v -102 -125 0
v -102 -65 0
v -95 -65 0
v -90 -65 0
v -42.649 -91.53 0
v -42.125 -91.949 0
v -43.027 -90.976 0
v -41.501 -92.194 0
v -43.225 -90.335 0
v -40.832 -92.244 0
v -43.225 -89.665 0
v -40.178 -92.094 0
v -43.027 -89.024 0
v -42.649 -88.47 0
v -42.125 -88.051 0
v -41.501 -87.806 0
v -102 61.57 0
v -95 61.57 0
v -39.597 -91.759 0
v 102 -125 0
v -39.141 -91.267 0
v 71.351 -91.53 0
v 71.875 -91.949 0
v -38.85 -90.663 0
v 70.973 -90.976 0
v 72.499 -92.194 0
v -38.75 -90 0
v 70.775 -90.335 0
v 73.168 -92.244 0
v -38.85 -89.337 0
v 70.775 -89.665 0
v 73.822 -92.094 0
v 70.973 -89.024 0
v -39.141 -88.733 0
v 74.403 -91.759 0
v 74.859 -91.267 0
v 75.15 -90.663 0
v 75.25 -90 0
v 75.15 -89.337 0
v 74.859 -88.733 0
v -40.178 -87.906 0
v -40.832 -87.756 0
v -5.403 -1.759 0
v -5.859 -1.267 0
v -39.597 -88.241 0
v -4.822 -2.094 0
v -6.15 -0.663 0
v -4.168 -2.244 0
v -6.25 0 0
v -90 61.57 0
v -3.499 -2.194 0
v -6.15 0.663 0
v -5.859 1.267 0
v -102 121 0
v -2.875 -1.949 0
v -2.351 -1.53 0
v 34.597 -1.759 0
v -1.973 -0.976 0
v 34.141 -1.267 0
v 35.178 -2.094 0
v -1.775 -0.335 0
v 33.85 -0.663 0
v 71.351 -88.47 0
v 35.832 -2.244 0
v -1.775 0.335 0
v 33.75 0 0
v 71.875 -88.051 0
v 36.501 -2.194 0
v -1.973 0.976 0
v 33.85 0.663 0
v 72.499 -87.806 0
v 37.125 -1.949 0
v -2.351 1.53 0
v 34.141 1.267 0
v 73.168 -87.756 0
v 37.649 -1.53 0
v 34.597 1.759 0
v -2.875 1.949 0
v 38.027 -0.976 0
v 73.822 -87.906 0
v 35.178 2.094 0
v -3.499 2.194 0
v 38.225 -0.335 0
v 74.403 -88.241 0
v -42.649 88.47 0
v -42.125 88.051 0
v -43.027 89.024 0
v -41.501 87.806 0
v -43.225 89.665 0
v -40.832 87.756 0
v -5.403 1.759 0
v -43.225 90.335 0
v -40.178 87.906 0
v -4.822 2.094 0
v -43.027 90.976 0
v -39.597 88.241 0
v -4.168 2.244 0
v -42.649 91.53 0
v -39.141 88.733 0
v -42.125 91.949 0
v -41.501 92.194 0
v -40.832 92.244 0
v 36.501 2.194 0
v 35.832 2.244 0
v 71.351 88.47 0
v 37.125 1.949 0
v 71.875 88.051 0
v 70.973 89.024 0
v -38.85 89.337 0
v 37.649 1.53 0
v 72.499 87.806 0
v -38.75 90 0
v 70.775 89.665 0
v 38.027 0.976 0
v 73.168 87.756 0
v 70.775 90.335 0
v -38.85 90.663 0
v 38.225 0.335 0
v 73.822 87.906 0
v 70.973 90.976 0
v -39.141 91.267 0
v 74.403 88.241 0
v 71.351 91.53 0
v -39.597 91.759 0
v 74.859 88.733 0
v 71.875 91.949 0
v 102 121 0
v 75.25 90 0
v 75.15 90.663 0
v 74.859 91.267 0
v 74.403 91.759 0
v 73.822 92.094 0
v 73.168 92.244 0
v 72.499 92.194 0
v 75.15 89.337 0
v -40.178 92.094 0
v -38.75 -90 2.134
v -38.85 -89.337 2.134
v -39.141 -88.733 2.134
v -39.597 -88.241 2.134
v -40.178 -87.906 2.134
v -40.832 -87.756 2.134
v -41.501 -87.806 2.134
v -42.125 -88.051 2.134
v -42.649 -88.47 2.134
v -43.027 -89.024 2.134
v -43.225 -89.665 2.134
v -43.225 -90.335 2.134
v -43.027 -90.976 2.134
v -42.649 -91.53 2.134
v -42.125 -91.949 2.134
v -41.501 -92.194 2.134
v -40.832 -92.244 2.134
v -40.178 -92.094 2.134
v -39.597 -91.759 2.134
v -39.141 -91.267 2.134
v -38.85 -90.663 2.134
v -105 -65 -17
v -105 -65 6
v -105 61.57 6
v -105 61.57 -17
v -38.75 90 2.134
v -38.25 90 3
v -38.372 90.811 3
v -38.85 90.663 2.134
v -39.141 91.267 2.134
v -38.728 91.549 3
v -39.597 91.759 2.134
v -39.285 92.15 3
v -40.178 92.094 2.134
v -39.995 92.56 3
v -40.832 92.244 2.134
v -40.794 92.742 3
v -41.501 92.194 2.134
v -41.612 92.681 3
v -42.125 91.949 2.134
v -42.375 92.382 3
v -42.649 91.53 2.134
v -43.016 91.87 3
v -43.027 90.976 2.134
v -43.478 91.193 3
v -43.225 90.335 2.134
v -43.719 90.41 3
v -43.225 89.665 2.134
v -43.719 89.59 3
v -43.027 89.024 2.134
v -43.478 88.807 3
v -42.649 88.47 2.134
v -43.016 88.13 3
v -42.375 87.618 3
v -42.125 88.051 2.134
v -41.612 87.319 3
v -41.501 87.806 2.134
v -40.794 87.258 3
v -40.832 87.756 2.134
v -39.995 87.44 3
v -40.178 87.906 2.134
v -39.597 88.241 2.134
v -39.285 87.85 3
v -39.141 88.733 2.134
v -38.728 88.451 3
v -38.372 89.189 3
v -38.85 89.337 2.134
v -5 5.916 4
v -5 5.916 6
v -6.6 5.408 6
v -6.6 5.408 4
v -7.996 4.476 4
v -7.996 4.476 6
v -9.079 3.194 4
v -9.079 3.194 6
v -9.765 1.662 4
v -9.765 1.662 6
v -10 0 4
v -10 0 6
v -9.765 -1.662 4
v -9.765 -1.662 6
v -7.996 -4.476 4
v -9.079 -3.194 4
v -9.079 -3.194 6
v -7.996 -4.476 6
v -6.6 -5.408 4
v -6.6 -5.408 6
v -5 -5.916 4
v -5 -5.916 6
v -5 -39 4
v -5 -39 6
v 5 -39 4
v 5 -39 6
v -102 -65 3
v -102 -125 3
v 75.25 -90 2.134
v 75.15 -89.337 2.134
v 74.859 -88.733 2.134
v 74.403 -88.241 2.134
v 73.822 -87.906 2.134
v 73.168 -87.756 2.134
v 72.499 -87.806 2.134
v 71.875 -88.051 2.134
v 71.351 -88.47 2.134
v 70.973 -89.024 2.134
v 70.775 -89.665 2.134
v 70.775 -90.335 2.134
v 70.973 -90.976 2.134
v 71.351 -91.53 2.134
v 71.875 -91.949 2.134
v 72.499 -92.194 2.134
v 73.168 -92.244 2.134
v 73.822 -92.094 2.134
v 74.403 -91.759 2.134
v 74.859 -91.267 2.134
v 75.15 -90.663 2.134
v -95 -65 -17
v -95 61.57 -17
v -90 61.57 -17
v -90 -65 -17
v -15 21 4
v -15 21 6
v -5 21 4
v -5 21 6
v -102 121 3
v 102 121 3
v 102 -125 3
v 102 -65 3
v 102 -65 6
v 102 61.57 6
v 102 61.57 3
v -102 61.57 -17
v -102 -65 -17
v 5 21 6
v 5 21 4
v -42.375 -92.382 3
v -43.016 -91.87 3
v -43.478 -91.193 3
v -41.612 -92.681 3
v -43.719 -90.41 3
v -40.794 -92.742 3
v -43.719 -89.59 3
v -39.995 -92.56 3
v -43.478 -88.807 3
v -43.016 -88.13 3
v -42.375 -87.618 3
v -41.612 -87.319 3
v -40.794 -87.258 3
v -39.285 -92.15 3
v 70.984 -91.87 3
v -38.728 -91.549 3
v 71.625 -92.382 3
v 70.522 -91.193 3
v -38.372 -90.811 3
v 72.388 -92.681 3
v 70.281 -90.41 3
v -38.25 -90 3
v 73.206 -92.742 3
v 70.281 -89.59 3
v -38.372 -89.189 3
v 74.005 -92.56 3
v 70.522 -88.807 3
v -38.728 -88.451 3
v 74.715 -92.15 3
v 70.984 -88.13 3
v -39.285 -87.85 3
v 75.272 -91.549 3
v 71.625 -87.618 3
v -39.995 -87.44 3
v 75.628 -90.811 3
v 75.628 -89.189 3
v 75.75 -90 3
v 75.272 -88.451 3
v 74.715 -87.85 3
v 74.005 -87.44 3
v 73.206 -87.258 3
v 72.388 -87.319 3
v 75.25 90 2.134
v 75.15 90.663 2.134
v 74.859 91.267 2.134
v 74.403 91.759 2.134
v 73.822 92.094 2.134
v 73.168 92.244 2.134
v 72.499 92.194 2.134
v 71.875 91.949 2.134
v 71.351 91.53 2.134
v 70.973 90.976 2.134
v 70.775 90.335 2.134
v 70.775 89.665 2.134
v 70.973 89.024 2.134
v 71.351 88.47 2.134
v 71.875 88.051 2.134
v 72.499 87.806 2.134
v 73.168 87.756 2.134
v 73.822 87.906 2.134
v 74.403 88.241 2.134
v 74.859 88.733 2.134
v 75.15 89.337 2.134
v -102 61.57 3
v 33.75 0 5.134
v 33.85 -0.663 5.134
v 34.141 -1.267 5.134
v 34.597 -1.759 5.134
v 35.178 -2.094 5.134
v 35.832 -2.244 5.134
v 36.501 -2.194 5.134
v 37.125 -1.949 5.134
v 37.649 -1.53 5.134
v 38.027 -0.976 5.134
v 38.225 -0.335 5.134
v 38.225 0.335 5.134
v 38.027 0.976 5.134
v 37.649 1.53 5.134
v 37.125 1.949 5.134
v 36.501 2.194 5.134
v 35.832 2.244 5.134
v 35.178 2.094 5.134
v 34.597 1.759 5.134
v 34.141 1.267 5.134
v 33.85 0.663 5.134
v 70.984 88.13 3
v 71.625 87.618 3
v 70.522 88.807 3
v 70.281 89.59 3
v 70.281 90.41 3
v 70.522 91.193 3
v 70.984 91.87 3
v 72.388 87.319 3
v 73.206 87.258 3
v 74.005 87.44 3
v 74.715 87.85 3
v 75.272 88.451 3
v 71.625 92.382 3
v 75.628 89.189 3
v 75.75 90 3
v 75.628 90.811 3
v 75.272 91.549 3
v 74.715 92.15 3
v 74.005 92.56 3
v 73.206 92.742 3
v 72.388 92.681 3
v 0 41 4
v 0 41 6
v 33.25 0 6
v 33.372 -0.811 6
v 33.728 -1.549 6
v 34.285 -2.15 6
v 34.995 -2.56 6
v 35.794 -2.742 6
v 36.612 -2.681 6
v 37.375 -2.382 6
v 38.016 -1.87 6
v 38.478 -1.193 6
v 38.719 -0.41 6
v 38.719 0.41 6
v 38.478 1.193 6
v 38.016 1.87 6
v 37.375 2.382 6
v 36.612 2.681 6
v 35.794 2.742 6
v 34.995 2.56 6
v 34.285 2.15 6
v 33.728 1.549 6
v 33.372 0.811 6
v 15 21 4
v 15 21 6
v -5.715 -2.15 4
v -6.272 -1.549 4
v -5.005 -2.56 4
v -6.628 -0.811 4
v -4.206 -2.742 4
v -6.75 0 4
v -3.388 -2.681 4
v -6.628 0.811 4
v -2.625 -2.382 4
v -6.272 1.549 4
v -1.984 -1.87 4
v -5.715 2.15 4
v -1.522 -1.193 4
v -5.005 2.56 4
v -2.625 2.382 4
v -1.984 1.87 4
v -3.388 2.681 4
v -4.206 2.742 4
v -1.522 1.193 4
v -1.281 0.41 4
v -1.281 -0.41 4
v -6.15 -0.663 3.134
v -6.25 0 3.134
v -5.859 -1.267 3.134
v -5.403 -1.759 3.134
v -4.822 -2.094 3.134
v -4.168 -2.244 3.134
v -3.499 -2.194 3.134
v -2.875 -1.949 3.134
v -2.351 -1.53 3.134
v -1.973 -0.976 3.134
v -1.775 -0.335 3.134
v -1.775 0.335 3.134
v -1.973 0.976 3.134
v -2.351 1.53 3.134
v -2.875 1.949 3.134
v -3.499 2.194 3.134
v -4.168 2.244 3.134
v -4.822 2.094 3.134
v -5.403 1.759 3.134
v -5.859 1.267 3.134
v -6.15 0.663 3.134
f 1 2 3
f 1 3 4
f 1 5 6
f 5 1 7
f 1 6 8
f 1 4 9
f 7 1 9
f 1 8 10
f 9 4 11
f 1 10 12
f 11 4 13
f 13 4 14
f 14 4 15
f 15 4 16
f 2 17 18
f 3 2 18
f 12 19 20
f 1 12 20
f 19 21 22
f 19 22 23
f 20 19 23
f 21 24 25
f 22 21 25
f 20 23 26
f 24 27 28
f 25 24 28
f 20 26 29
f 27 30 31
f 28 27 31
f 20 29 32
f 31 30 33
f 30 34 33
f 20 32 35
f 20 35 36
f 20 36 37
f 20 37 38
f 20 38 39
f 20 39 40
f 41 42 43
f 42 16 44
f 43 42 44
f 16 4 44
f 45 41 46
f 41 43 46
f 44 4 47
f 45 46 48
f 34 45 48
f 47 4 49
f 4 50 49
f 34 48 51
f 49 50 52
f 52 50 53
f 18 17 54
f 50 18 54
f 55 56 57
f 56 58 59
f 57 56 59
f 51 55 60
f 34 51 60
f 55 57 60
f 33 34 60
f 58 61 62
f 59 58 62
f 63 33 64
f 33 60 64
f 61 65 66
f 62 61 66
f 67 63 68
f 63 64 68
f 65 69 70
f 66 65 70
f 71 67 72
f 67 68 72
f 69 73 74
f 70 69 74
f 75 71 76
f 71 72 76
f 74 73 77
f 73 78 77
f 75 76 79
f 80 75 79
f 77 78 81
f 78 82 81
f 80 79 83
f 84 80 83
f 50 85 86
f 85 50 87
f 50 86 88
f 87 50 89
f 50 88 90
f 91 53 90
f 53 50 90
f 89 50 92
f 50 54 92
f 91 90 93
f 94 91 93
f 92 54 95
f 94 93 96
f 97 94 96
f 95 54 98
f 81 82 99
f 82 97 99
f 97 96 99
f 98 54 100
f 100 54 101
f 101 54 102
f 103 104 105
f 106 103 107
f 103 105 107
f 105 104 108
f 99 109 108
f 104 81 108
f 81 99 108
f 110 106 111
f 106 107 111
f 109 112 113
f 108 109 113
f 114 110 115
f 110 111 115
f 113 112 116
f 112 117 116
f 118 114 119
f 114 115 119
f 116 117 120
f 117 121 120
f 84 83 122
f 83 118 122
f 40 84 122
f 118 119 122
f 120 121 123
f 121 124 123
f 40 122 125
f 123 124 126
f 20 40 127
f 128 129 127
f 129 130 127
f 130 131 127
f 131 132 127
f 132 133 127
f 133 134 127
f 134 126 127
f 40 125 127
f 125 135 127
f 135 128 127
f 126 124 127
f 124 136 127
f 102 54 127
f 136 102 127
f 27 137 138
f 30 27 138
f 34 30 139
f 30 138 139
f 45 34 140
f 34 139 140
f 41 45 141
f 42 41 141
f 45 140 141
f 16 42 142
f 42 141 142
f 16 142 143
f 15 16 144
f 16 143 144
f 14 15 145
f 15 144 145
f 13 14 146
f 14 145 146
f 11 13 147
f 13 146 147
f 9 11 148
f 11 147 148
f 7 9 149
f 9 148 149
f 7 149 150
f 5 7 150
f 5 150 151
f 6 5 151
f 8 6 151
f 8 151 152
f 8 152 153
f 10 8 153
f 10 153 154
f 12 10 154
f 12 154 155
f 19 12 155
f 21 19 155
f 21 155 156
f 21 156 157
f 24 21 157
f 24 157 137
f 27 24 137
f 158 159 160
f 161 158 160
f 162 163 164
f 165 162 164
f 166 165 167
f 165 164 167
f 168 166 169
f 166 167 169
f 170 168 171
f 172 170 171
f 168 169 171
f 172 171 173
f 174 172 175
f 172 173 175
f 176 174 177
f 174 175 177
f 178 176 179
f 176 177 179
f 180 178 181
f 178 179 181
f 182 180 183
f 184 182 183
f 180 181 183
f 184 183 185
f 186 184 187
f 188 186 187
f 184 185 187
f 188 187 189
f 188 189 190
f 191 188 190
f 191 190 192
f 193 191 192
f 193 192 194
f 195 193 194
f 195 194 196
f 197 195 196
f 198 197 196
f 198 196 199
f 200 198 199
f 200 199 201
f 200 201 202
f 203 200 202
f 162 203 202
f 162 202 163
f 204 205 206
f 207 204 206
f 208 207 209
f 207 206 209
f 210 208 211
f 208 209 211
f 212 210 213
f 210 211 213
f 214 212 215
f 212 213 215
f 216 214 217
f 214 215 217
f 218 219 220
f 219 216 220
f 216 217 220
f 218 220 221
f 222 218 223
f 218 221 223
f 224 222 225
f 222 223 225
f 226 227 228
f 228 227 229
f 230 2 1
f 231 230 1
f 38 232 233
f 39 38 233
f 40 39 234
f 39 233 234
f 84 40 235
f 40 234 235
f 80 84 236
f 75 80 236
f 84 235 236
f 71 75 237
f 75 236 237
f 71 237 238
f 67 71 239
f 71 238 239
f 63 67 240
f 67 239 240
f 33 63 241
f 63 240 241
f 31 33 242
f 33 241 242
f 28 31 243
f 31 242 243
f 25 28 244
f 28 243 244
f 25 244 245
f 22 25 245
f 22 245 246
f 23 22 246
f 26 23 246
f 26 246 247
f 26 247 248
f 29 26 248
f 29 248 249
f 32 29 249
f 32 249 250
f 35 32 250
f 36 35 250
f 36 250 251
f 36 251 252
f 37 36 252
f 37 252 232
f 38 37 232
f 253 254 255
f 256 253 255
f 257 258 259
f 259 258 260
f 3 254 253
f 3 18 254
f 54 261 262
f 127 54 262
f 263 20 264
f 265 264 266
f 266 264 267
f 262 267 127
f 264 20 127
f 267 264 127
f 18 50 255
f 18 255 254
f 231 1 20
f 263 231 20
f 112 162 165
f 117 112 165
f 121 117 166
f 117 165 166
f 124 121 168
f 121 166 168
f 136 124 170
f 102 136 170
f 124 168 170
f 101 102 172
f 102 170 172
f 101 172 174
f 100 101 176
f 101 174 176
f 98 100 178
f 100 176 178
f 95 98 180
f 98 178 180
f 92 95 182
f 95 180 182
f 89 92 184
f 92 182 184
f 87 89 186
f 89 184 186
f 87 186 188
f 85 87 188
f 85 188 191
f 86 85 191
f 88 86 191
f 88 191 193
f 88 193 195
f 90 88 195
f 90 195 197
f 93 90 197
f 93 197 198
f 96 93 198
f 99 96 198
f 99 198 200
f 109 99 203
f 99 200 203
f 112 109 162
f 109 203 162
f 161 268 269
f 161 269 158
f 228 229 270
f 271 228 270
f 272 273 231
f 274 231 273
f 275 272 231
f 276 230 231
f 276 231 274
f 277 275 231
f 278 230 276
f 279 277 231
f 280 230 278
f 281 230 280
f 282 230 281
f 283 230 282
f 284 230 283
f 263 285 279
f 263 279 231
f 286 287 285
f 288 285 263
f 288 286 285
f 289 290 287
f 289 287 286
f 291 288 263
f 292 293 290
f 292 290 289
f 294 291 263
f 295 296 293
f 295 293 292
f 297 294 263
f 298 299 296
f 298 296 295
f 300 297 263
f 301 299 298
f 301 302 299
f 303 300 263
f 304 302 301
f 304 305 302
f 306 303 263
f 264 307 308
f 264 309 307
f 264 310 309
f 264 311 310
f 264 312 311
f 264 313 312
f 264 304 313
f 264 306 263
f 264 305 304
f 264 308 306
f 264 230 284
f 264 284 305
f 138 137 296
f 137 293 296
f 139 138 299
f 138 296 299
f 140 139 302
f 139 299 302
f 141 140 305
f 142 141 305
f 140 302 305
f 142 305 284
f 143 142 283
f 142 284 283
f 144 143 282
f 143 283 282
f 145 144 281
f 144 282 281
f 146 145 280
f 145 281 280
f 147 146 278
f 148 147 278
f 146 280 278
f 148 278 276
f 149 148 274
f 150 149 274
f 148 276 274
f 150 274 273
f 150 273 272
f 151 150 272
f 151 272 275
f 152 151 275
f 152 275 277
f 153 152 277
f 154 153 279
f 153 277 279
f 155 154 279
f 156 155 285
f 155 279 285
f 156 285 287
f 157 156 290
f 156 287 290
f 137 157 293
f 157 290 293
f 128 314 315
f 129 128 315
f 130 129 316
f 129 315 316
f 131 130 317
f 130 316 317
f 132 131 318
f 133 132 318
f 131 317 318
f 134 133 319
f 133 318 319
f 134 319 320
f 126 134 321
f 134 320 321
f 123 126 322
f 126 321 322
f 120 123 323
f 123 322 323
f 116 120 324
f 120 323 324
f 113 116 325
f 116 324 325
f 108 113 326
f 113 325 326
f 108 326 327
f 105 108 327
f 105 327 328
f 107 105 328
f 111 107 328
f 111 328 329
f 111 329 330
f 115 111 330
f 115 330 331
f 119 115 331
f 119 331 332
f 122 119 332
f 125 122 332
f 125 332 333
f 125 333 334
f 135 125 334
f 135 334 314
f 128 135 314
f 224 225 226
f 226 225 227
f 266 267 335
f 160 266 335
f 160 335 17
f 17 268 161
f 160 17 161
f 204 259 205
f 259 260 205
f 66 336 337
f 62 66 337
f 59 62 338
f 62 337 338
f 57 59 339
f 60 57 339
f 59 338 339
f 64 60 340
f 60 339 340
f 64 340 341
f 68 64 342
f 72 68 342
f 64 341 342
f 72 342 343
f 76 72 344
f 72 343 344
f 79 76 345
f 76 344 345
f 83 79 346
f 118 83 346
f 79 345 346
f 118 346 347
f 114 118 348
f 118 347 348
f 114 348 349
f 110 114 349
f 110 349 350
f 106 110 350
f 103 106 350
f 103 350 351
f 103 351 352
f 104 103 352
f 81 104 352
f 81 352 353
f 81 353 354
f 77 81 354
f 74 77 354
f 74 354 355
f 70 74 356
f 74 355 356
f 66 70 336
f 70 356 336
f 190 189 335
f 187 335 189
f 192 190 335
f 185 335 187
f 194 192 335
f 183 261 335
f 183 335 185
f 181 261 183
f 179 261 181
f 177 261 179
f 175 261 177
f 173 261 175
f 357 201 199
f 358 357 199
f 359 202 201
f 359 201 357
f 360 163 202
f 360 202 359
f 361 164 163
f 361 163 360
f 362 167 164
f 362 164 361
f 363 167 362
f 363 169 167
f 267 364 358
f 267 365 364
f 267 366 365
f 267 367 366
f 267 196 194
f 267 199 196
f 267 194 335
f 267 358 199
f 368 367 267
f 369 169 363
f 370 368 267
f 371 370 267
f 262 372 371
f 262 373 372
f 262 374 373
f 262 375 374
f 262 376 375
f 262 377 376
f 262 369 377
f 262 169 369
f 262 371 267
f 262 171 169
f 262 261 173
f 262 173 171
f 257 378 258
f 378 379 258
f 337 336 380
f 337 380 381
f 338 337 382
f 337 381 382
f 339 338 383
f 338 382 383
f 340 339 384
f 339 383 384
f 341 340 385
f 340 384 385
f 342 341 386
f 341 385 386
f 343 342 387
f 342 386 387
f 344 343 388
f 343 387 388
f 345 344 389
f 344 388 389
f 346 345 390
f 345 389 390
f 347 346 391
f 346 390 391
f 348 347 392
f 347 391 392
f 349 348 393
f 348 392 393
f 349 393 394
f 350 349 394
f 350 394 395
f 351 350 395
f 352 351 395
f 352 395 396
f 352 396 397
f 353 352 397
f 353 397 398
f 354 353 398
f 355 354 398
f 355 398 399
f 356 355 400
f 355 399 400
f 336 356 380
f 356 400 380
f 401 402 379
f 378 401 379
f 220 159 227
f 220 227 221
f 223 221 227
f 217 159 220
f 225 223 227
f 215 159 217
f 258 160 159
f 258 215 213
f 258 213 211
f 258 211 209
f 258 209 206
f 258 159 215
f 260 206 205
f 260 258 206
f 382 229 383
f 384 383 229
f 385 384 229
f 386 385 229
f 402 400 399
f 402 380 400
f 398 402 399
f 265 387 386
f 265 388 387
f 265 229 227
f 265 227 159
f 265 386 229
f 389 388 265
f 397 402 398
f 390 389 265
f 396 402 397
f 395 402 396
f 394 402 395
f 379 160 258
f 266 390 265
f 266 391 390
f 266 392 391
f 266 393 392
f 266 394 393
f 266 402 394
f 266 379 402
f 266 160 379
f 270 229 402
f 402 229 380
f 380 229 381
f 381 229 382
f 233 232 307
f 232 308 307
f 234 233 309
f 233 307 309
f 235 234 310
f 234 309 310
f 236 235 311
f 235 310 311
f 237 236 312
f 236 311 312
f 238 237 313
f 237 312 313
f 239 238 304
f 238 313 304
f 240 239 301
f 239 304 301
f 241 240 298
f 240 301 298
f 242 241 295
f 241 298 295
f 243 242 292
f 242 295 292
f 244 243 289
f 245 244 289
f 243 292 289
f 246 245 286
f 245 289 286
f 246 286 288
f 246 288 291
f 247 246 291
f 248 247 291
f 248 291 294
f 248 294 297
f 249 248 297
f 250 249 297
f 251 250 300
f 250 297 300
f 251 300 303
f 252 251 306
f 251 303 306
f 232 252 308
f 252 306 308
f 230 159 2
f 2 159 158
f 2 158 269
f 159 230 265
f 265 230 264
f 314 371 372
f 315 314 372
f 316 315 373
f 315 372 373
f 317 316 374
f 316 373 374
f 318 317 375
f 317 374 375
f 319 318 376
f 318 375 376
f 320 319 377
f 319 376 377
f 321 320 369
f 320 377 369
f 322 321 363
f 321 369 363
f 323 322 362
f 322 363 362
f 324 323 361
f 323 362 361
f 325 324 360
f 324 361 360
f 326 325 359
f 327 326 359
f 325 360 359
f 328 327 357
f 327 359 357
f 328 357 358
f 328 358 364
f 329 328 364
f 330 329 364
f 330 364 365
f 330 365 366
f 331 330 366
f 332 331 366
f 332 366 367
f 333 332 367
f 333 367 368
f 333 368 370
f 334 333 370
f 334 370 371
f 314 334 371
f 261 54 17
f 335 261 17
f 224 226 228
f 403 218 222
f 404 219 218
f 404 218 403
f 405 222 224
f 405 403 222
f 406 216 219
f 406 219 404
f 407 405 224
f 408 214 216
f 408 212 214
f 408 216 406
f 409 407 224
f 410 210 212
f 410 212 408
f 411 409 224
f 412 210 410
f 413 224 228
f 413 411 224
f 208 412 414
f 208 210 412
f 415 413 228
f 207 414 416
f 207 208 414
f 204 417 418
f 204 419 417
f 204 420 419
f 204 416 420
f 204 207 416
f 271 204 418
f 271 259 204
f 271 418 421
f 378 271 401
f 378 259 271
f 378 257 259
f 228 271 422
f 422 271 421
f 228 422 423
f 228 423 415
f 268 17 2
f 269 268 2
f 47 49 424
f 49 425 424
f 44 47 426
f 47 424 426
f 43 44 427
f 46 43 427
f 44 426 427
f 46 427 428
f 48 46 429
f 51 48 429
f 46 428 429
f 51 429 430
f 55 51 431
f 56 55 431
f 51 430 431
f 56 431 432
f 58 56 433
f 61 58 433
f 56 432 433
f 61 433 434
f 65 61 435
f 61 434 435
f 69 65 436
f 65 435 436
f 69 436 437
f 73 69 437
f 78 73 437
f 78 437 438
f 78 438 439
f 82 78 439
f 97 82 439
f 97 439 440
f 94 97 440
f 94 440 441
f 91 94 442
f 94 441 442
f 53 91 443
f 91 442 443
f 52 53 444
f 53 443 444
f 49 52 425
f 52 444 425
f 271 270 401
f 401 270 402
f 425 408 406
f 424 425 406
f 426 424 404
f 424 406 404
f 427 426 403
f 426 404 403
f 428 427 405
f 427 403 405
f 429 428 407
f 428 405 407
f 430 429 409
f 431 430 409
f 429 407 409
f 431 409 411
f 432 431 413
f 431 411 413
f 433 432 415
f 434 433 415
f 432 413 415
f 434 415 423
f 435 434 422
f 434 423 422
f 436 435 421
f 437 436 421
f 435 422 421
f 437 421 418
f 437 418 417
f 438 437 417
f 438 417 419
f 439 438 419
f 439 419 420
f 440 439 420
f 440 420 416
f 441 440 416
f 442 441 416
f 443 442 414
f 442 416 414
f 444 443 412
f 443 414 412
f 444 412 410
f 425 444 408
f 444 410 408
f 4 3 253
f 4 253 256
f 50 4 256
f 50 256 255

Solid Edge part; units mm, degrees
sketch "Sketch1" plane through (0, 0, 0) normal (0, 0, 1) x (1, 0, 0)
  line L0 (-102, -125) -> (102, -125)
  line L1 (102, -125) -> (102, 125)
  line L2 (102, 125) -> (-102, 125)
  line L3 (-102, 125) -> (-102, -125)
  dimension "D1" = 204
  dimension "D2" = 250
extrude "Protrusion1" add sketch "Sketch1" along normal blind 3
sketch "Sketch2" plane through (0, 0, 3) normal (0, 0, 1) x (1, 0, 0)
  circle A0 centre (73, 90) radius 2.25
  circle A1 centre (73, -90) radius 2.25
  circle A2 centre (-41, -90) radius 2.25
  circle A3 centre (-41, 90) radius 2.25
  dimension "D1" = 180
  dimension "D2" = 4.5
  dimension "D3" = 114
  dimension "D4" = 73
extrude "Cutout1" cut sketch "Sketch2" against normal through all
sketch "Sketch3" plane through (0, 0, 3) normal (0, 0, 1) x (1, 0, 0)
  line L0 (-102, -65) -> (102, -65)
  line L1 (102, -65) -> (102, 61.57)
  line L2 (102, 61.57) -> (-102, 61.57)
  line L3 (-102, 61.57) -> (-102, -65)
  dimension "D1" = 65
  dimension "D2" = 61.57
extrude "Extrusionsausprägung_2" add sketch "Sketch3" along normal blind 3
sketch "Sketch4" plane through (0, 93.285, 3) normal (0, 0, 1) x (-1, 0, 0)
  line L0 (-102, -31.715) -> (102, -31.715)
  line L1 (102, -31.715) -> (102, -27.715)
  line L2 (102, -27.715) -> (-102, -27.715)
  line L3 (-102, -27.715) -> (-102, -31.715)
  dimension "D1" = 4
extrude "Cutout2" cut sketch "Sketch4" against normal through all
sketch "Sketch5" plane through (0, -1.715, 6) normal (0, 0, 1) x (-1, 0, 0)
  line L0 (5, -22.715) -> (5, 37.285)
  line L1 (5, 37.285) -> (-5, 37.285)
  line L2 (-5, 37.285) -> (-5, -22.715)
  line L3 (-5, -22.715) -> (-15, -22.715)
  line L4 (-15, -22.715) -> (0, -42.715)
  line L5 (0, -42.715) -> (15, -22.715)
  line L6 (15, -22.715) -> (5, -22.715)
  dimension "D1" = 10
  dimension "D2" = 60
  dimension "D3" = 10
  dimension "D4" = 25
  dimension "D5" = 26
extrude "Cutout3" cut sketch "Sketch5" against normal blind 2
sketch "Sketch6" plane through (0, -1.715, 6) normal (0, 0, 1) x (-1, 0, 0)
  circle A0 centre (4, -1.715) radius 2.25
  circle A1 centre (-36, -1.715) radius 2.25
extrude "Cutout4" cut sketch "Sketch6" against normal through all
sketch "Sketch7" plane through (0, -1.715, 6) normal (0, 0, 1) x (-1, 0, 0)
  circle A0 centre (4, -1.715) radius 6
  dimension "D1" = 12
extrude "Cutout5" cut sketch "Sketch7" against normal up to vertex (2 mm away)
chamfer "Fase_2" distance 0.5 angle 60 6 edges at (70.75, -90, 3) (-43.25, -90, 3) (38.25, 0, 6) (-1.75, 0, 4) (-43.25, 90, 3) (70.75, 90, 3) measured on face at (-70.04, -42.6393, 6)
sketch "Sketch8" plane through (0, -1.715, 6) normal (0, 0, 1) x (-1, 0, 0)
  line L0 (102, 63.285) -> (105, 63.285)
  line L1 (105, 63.285) -> (105, -63.285)
  line L2 (105, -63.285) -> (102, -63.285)
  line L3 (102, -63.285) -> (102, 63.285)
  dimension "D1" = 3
extrude "Extrusionsausprägung_3" add sketch "Sketch8" against normal blind 23
sketch "Sketch9" plane through (0, -2, 0) normal (0, 0, -1) x (1, 0, 0)
  line L0 (-95, 63) -> (-90, 63)
  line L1 (-90, 63) -> (-90, -63.57)
  line L2 (-90, -63.57) -> (-95, -63.57)
  line L3 (-95, -63.57) -> (-95, 63)
  dimension "D1" = 5
  dimension "D2" = 7
extrude "Protrusion2" add sketch "Sketch9" along normal up to vertex (17 mm away)
properties material "Nylon, allgemein"
